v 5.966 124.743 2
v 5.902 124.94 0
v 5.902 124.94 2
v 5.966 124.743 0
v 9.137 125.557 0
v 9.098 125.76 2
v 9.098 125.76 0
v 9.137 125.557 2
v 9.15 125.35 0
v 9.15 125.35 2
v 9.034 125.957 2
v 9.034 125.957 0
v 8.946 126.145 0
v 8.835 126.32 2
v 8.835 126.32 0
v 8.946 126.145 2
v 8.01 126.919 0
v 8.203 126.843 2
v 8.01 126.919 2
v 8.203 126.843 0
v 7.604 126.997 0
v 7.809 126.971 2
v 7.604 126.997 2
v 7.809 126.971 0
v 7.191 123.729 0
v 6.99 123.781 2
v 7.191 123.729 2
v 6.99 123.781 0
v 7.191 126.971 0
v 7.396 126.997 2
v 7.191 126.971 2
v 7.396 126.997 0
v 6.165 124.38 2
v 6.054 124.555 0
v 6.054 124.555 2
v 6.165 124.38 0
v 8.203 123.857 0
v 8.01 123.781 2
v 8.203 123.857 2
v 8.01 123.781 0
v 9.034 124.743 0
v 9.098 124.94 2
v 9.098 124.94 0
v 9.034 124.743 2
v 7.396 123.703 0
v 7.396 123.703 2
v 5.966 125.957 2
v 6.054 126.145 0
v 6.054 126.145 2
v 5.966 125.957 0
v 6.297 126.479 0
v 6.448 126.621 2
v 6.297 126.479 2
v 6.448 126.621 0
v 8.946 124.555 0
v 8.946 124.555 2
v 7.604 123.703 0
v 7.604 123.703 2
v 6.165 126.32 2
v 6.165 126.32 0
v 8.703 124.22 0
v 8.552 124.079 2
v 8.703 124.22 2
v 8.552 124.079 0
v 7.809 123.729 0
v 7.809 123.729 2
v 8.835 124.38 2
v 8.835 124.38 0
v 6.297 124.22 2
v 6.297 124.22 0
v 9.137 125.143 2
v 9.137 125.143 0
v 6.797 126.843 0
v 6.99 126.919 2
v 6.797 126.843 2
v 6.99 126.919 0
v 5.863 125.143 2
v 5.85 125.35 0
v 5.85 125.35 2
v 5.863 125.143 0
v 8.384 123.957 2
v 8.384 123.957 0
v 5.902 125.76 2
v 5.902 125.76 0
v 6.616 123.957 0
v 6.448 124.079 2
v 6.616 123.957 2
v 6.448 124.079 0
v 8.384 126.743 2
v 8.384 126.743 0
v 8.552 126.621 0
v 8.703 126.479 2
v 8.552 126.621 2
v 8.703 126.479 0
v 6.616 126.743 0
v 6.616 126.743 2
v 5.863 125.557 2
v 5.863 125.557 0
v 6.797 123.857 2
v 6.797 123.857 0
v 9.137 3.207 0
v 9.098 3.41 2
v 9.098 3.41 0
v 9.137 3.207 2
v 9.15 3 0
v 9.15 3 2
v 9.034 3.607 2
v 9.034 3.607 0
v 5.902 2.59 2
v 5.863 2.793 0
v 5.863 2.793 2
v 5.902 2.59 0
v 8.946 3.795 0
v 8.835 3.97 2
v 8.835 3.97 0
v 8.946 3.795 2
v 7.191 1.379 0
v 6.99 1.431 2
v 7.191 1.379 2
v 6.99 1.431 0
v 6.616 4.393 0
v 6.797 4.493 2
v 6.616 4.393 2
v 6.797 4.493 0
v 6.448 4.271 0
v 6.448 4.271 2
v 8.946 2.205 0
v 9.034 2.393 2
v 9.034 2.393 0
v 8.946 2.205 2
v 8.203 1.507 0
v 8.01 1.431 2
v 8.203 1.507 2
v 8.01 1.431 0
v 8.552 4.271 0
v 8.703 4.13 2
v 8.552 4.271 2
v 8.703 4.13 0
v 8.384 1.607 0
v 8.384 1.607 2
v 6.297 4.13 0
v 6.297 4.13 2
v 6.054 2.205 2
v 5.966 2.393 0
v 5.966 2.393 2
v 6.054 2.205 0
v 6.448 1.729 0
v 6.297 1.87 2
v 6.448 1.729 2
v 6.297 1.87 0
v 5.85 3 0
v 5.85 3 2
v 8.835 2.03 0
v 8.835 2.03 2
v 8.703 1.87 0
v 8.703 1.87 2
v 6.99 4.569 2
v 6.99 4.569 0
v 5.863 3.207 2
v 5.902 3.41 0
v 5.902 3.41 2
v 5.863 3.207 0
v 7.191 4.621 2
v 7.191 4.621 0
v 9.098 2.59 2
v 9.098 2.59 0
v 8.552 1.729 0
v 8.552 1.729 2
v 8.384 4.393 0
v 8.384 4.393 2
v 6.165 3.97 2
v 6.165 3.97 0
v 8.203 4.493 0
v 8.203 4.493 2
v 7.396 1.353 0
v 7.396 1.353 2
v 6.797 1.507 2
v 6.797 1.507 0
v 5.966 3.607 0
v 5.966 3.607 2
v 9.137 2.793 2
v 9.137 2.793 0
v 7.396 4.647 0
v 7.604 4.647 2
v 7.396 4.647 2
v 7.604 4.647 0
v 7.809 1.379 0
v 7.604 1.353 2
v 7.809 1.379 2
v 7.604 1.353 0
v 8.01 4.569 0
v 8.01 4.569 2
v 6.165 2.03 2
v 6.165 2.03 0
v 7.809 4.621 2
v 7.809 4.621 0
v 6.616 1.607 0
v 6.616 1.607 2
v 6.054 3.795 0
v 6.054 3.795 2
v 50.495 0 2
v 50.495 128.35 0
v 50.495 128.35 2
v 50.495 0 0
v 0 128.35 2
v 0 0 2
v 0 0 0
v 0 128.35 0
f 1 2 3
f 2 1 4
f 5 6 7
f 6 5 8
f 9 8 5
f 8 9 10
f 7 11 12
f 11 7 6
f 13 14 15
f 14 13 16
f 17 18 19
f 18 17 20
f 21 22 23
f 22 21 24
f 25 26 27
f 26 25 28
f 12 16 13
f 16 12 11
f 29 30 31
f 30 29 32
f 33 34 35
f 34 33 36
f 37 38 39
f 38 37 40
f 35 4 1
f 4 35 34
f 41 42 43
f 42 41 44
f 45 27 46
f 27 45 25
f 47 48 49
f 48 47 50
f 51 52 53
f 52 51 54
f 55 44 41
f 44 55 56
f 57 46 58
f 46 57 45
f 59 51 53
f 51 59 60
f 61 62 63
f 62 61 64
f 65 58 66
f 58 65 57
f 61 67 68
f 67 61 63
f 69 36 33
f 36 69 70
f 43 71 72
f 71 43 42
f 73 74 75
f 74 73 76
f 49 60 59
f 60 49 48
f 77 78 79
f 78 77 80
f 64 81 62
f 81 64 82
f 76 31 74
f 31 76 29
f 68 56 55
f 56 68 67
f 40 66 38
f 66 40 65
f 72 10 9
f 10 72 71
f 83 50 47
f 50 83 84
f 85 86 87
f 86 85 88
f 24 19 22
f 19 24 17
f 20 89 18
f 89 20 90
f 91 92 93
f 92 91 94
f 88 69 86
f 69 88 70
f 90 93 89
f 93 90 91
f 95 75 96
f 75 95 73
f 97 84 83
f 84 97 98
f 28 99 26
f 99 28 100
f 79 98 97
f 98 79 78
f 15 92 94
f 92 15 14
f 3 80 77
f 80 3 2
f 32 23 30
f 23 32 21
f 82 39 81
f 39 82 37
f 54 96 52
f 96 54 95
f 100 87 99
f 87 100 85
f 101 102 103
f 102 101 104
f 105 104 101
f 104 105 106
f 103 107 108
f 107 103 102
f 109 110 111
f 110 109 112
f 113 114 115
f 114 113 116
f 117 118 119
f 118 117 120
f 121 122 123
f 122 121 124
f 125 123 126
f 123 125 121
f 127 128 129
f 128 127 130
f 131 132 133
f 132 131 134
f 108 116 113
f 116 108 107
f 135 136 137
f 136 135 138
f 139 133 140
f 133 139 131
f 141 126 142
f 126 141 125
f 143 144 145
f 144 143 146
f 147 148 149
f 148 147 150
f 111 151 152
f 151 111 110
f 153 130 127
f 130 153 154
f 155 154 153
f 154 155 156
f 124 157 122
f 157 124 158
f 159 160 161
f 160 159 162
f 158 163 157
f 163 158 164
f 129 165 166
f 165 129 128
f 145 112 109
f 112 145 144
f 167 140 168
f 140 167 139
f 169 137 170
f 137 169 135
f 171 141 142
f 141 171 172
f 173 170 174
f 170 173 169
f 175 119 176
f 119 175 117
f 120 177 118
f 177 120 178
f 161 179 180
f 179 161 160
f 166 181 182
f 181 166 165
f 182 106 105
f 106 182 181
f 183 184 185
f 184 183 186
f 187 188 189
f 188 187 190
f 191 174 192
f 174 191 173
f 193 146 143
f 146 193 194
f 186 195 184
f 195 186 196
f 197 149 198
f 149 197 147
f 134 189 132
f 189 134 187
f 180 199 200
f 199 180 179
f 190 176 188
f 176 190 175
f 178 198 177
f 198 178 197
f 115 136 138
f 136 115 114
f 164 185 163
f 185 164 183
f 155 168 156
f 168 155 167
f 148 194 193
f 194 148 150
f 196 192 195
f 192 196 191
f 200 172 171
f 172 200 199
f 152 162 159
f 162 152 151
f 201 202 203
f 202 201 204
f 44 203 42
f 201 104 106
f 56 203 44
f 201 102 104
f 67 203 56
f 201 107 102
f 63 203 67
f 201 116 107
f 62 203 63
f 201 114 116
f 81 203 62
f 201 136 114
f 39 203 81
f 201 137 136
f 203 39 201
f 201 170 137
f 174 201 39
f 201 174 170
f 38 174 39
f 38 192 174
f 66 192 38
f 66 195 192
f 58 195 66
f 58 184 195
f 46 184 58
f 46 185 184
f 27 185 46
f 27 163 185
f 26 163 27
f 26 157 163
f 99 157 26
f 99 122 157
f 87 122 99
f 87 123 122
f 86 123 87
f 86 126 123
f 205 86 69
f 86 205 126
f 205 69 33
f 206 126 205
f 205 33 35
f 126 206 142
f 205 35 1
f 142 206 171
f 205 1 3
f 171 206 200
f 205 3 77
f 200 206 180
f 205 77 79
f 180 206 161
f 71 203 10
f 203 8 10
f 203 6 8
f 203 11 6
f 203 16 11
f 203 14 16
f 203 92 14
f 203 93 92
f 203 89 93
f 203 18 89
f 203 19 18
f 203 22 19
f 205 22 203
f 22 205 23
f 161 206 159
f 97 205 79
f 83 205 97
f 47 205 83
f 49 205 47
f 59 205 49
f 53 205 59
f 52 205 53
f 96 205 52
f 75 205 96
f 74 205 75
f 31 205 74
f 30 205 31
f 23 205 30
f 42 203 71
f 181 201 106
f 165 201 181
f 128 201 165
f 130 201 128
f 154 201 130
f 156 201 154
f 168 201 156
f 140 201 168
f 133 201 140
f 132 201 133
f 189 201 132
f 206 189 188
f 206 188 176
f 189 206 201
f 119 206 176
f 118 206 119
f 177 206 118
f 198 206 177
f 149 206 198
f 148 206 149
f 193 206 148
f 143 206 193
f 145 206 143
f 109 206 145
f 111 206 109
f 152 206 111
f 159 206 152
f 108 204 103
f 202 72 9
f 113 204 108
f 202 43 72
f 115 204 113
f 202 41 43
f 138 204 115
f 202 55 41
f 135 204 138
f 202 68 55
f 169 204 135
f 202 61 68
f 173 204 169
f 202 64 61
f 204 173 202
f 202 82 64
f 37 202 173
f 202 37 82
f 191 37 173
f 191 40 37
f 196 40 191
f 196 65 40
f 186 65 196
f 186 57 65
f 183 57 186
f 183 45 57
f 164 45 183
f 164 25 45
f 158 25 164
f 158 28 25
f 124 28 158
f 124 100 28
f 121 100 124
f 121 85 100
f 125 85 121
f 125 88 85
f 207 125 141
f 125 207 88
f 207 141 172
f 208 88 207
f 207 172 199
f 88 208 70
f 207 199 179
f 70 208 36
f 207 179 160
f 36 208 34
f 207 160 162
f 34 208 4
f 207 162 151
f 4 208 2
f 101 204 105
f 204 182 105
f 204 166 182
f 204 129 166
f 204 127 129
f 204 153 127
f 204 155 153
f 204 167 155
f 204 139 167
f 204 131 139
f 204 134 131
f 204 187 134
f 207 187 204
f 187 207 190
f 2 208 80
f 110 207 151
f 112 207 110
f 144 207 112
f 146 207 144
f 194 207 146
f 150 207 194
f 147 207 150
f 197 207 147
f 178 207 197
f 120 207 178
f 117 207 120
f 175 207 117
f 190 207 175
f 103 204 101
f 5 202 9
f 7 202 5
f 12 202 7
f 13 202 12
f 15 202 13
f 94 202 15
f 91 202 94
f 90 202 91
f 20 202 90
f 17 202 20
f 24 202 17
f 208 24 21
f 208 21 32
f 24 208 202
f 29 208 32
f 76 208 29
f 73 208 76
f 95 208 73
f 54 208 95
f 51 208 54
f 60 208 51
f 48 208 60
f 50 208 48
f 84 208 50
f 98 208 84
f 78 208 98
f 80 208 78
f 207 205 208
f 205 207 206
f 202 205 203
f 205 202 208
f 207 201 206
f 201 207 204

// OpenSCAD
mm = 1;
hp1 = 5.08*mm;
u3 = 133.35*mm;
eu3 = u3 - 5*mm;
m3_clearance = 3.30*mm;
d=0.001;
$fn=50;

module panel(hp_width) {
    realwidth = (hp1 * hp_width) - ((hp1 * hp_width) * 0.006);
    difference() {
        cube([realwidth, eu3, 2*mm]);
        if (hp_width <= 10) { // two holes
            translate([7.5*mm, eu3-3.0*mm, -d]) cylinder(h=(2+2*d)*mm, d=m3_clearance);
            translate([7.5*mm, 3.0*mm, -d]) cylinder(h=(2+2*d)*mm, d=m3_clearance);
        } else { // four holes
            nh = hp_width-3;
            // top
            translate([7.5*mm, eu3-3.0*mm, -d]) cylinder(h=(2+2*d)*mm, d=m3_clearance);
            translate([7.5*mm + (nh*5.08*mm), eu3-3.0*mm, -d]) cylinder(h=(2+2*d)*mm, d=m3_clearance);
            // bottom
            translate([7.5*mm, 3.0*mm, -d]) cylinder(h=(2+2*d)*mm, d=m3_clearance);
            translate([7.5*mm + (nh*5.08*mm), 3.0*mm, -d]) cylinder(h=(2+2*d)*mm, d=m3_clearance);
        }
    }
}

panel(10);
//projection() panel(10);
